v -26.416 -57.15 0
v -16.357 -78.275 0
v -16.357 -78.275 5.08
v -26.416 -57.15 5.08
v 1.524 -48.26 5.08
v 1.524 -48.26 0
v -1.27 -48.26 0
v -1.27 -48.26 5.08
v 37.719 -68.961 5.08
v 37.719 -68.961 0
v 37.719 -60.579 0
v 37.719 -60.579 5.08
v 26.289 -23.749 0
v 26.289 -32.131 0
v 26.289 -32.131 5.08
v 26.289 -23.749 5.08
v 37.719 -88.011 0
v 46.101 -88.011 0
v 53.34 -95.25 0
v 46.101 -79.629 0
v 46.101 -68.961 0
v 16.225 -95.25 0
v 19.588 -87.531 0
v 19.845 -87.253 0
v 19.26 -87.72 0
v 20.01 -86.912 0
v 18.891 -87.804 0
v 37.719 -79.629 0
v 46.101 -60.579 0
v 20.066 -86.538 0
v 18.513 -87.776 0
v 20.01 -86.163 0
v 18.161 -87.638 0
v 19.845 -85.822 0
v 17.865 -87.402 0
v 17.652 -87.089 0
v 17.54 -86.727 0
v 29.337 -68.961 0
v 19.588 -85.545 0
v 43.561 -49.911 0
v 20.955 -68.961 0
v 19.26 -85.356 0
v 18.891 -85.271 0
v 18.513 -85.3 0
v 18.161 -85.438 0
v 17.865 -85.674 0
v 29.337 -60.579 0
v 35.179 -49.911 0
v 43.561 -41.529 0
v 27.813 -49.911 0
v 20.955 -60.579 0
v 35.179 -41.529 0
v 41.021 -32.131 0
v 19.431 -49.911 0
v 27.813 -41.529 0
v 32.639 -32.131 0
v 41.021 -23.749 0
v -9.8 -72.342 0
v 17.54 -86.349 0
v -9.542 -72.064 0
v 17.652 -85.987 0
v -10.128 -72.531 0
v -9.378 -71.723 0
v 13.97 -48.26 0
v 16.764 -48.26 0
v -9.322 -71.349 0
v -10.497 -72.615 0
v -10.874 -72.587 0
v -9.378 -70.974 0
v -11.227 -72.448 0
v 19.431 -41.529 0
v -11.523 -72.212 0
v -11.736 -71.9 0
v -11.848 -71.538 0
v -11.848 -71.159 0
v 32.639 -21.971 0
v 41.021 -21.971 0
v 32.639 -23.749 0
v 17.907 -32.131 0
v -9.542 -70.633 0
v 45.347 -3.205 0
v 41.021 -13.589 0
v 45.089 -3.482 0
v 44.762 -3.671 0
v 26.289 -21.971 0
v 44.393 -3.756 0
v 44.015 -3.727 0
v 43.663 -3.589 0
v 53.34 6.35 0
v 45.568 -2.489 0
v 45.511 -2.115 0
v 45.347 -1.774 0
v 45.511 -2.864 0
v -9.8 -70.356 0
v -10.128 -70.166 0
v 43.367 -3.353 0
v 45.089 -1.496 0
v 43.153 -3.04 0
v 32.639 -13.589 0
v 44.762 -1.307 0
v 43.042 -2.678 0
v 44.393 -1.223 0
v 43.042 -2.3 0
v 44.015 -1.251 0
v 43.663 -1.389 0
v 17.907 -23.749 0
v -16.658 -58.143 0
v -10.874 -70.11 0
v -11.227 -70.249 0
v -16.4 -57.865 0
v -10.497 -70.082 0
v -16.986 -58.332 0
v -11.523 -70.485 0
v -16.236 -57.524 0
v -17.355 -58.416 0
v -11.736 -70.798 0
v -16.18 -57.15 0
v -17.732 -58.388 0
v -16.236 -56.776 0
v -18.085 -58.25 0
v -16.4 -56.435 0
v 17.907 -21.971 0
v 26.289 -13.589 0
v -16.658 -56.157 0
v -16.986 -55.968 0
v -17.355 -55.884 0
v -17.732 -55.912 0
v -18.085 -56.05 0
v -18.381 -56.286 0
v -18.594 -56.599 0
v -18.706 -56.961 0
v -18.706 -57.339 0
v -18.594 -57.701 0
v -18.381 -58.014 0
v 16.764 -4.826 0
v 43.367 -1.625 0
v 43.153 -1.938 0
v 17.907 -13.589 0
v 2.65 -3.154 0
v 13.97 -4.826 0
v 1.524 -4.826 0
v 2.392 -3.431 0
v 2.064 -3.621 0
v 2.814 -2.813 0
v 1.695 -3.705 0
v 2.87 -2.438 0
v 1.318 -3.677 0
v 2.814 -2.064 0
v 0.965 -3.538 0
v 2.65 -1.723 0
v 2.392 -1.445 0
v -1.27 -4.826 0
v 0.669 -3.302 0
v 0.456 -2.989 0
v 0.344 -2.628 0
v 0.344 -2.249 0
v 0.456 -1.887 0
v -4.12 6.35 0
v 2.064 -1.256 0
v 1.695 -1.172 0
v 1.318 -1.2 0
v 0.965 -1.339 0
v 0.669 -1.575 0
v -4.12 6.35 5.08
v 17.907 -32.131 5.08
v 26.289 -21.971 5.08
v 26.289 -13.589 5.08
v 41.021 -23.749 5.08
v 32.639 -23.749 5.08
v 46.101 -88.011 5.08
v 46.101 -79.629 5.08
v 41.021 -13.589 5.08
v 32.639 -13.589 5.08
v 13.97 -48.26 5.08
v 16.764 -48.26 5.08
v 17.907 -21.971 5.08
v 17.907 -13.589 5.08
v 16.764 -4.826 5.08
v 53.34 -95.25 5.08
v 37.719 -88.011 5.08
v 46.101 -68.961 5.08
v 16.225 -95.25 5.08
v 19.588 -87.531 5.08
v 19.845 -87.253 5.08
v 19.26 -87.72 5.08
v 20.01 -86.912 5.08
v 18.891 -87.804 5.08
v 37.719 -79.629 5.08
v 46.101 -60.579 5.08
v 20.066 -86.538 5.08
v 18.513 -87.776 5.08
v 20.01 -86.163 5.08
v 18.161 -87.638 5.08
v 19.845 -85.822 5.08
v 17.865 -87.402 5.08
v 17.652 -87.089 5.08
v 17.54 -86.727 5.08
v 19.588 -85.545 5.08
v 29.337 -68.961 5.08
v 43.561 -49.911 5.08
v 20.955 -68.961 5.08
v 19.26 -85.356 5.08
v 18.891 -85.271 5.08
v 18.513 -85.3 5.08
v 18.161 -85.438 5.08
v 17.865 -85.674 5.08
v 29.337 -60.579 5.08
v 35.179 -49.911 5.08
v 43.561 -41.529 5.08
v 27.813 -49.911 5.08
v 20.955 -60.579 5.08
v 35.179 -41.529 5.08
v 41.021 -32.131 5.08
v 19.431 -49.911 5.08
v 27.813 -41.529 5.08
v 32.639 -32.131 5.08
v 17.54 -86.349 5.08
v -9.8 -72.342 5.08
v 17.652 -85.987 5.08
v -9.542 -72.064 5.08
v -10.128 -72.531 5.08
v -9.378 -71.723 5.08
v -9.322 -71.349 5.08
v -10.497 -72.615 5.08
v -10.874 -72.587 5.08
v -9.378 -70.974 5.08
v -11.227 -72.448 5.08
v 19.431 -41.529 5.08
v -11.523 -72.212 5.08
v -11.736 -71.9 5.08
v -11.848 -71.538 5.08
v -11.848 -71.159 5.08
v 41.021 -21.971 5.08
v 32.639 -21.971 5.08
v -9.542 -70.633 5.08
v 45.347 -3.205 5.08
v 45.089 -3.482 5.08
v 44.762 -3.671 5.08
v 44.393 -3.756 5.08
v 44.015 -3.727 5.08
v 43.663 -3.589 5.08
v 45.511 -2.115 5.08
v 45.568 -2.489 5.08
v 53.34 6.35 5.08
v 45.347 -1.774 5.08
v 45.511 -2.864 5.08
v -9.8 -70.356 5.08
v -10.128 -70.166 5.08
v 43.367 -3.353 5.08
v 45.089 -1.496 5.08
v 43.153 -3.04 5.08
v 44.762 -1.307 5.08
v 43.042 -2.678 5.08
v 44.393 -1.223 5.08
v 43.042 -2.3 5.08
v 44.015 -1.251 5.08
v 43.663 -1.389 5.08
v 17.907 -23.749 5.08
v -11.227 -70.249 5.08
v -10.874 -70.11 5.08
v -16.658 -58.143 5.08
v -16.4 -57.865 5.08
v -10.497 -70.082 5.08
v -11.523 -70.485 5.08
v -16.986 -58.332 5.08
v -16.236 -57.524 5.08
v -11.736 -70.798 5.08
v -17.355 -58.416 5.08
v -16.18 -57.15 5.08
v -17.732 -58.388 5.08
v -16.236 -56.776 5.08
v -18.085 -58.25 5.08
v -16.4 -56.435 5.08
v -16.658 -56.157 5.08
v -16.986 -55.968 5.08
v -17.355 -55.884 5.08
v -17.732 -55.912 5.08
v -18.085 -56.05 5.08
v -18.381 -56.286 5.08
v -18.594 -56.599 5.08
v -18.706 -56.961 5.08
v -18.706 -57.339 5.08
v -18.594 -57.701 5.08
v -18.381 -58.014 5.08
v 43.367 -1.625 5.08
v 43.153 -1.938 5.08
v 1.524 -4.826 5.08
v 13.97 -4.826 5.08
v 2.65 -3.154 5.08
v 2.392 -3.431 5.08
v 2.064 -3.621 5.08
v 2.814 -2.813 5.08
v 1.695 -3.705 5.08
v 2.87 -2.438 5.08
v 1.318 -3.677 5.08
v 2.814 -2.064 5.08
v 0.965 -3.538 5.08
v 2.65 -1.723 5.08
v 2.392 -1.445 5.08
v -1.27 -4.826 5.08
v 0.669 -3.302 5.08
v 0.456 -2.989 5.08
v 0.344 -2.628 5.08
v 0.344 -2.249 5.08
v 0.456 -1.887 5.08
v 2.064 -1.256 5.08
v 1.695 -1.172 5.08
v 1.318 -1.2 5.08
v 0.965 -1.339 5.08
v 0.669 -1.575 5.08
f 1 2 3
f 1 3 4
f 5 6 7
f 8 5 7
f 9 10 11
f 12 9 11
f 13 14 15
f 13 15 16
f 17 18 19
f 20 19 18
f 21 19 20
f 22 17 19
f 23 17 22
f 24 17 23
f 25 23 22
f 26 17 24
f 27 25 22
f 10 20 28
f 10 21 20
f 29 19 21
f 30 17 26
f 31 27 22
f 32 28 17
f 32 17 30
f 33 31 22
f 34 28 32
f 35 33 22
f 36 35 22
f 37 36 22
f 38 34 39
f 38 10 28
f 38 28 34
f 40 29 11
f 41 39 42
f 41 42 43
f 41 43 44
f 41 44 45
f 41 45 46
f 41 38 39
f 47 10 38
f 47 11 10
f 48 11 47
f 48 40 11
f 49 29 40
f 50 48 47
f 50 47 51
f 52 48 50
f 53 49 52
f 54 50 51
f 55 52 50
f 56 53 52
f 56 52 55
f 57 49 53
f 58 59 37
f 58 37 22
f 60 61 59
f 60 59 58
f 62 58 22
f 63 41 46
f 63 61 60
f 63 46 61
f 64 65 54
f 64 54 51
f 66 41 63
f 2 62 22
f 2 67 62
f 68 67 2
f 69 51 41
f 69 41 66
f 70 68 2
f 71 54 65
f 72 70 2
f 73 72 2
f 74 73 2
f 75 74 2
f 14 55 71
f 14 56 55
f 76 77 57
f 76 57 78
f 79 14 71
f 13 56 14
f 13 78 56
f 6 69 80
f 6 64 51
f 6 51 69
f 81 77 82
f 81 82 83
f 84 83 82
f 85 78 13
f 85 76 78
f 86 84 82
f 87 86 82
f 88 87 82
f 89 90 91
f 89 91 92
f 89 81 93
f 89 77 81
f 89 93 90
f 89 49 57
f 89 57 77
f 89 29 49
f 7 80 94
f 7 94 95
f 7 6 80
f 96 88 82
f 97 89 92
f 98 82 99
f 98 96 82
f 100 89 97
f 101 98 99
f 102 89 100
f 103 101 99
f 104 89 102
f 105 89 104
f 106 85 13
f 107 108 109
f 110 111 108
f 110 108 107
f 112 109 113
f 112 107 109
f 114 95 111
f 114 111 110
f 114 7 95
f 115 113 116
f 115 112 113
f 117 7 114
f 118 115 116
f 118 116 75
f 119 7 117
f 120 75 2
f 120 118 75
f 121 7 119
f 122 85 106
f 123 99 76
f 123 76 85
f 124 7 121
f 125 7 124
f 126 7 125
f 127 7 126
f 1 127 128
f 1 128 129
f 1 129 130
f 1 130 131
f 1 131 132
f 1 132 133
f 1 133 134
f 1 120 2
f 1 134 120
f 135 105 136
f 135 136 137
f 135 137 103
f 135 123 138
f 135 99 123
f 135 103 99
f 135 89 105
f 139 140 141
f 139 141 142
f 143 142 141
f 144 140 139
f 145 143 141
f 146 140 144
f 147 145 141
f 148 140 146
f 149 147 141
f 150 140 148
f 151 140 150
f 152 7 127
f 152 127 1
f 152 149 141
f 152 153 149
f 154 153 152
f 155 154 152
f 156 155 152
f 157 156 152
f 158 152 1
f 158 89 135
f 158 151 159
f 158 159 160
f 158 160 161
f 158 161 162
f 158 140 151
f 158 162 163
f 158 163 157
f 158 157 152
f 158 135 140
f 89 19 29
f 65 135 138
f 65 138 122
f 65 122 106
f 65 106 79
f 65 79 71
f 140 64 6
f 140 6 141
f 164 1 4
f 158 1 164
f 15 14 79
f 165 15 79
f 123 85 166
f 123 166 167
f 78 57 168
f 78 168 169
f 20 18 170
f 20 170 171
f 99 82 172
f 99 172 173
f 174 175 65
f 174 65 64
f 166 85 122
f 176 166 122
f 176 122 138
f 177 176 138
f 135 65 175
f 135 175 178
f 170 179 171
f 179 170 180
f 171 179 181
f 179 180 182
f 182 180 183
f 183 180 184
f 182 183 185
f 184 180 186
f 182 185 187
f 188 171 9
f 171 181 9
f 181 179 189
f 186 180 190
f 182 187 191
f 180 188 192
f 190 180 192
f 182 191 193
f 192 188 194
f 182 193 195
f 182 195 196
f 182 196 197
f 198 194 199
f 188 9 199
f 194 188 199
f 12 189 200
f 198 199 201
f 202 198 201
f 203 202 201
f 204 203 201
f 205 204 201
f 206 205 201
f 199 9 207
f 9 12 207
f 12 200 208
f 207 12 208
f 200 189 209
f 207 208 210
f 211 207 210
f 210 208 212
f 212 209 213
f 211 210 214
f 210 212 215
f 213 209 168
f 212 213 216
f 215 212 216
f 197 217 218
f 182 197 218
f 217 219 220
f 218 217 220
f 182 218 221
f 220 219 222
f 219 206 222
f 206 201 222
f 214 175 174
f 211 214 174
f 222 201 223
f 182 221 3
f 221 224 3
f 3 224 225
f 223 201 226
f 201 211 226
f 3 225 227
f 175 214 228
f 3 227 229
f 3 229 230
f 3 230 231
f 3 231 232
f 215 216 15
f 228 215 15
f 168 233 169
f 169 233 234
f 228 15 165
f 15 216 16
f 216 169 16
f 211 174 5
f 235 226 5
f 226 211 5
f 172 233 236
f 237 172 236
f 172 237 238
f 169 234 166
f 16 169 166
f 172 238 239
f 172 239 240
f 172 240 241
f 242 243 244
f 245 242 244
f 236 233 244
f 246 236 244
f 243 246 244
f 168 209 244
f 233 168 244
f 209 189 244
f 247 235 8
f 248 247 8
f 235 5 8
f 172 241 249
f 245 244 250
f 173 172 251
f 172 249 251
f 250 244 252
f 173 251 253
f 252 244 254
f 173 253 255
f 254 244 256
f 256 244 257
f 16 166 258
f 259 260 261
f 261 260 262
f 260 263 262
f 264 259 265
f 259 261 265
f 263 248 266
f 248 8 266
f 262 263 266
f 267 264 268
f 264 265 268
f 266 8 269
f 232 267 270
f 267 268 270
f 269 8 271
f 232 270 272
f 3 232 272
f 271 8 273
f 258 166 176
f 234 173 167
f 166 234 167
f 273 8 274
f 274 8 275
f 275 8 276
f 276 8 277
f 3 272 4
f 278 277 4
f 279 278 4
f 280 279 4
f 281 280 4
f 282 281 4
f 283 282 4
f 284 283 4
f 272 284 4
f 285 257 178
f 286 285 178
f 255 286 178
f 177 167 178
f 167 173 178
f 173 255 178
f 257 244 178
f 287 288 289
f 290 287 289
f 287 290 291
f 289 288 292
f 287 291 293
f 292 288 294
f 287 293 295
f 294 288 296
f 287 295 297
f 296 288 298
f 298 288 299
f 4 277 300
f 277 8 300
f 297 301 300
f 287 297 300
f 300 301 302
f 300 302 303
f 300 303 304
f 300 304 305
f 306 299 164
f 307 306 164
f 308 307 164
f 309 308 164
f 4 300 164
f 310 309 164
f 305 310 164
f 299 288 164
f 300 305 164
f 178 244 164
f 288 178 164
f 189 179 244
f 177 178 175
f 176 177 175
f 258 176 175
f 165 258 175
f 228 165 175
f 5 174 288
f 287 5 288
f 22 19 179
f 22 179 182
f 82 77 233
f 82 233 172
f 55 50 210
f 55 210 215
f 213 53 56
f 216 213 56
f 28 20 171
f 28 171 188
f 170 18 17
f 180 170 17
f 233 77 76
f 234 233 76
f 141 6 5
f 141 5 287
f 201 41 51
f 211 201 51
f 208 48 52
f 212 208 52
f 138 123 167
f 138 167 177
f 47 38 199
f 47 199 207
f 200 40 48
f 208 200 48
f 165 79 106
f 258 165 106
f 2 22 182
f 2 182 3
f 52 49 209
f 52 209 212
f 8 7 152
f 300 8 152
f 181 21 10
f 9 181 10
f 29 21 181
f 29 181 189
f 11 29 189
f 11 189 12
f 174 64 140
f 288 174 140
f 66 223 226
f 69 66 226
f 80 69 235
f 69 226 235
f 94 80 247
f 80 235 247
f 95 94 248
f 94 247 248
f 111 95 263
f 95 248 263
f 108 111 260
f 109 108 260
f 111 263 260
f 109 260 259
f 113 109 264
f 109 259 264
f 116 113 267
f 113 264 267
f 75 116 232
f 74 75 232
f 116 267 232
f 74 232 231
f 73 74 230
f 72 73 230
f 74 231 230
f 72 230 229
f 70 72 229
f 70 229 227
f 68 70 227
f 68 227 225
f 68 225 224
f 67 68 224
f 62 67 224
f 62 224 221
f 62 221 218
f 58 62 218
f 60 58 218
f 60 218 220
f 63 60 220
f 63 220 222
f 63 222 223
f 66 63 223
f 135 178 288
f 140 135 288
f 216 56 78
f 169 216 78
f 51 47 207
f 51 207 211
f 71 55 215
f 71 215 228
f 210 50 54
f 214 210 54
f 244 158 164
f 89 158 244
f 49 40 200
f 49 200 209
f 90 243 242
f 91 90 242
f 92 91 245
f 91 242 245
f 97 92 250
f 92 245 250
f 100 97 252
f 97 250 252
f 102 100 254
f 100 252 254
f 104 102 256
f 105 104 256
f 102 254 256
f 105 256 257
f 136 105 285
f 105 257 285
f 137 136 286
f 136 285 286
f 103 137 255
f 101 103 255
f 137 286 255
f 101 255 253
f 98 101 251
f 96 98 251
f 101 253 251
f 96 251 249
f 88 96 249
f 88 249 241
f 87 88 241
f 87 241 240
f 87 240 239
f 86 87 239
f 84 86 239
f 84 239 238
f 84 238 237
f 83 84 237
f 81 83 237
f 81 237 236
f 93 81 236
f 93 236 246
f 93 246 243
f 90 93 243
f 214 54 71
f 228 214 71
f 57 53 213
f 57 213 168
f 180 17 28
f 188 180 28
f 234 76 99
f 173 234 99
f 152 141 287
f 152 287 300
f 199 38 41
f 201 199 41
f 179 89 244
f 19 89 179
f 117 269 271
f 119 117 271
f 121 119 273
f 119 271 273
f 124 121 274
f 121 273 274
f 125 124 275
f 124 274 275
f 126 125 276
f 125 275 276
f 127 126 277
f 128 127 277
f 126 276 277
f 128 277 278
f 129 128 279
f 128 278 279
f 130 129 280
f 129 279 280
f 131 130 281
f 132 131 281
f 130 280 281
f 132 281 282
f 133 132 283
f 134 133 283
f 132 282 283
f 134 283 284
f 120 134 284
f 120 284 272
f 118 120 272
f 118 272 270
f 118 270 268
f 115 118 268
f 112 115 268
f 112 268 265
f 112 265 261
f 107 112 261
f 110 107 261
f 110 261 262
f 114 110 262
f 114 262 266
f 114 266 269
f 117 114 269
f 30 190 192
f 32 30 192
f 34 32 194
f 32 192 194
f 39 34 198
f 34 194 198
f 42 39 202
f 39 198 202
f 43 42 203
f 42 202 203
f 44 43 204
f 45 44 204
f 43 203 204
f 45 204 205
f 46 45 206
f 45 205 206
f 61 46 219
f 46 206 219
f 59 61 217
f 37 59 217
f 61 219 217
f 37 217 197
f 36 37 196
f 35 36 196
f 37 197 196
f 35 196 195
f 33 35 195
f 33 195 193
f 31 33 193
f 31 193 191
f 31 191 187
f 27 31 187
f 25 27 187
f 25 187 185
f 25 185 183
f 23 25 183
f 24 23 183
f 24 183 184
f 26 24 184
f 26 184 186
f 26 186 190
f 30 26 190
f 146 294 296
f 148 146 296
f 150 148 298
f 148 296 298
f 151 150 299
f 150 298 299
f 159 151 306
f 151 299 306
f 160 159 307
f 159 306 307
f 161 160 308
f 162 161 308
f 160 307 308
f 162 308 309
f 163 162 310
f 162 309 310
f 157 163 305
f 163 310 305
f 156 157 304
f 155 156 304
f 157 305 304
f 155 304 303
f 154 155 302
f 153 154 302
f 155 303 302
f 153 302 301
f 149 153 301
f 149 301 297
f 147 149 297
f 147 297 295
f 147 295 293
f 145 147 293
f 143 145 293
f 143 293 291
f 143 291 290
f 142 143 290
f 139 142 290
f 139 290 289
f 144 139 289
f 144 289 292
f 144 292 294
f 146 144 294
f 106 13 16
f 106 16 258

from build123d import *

# Parameters (mm, degrees)
BOSS_EXTRUDE1_DEPTH = 5.08
SKETCH5_W           = 8.382
SKETCH5_H           = 8.382
SKETCH5_W_2         = 2.794
SKETCH5_H_2         = 43.434
CUT_EXTRUDE1_DEPTH  = 6.08
SKETCH7_R           = 1.27
CUT_EXTRUDE3_DEPTH  = 6.08


with BuildPart() as part:
    # Sketch1 → Boss-Extrude1 (new body)
    with BuildSketch(Plane.XY):
        Polygon((-4.120444444, 6.35), (53.34, 6.35), (53.34, -95.25), (16.22499019, -95.25), (-16.356614113, -78.274710363), (-26.416, -57.15), align=None)
    extrude(amount=BOSS_EXTRUDE1_DEPTH)

    # Sketch5 → Cut-Extrude1 (cut, through all)
    with BuildSketch(Plane(origin=(0, 0, 0), x_dir=(-1, 0, 0), z_dir=(0, 0, -1))):
        with Locations((-36.83, -17.78)):
            Rectangle(SKETCH5_W, SKETCH5_H)
        with Locations((-39.37, -45.72)):
            Rectangle(SKETCH5_W, SKETCH5_H)
        with Locations((-36.83, -27.94)):
            Rectangle(SKETCH5_W, SKETCH5_H)
        with Locations((-41.91, -64.77)):
            Rectangle(SKETCH5_W, SKETCH5_H)
        with Locations((-41.91, -83.82)):
            Rectangle(SKETCH5_W, SKETCH5_H)
        with Locations((-22.098, -17.78)):
            Rectangle(SKETCH5_W, SKETCH5_H)
        with Locations((-22.098, -27.94)):
            Rectangle(SKETCH5_W, SKETCH5_H)
        with Locations((-23.622, -45.72)):
            Rectangle(SKETCH5_W, SKETCH5_H)
        with Locations((-25.146, -64.77)):
            Rectangle(SKETCH5_W, SKETCH5_H)
        with Locations((-15.367, -26.543)):
            Rectangle(SKETCH5_W_2, SKETCH5_H_2)
        with Locations((-0.127, -26.543)):
            Rectangle(SKETCH5_W_2, SKETCH5_H_2)
    extrude(amount=-CUT_EXTRUDE1_DEPTH, mode=Mode.SUBTRACT)

    # Sketch7 → Cut-Extrude3 (cut, through all)
    with BuildSketch(Plane.XY.offset(5.08)):
        with Locations((44.2976, -2.4892)):
            Circle(SKETCH7_R)
        with Locations((1.6002, -2.4384)):
            Circle(SKETCH7_R)
        with Locations((-17.4498, -57.15)):
            Circle(SKETCH7_R)
        with Locations((-10.5918, -71.3486)):
            Circle(SKETCH7_R)
        with Locations((18.796, -86.5378)):
            Circle(SKETCH7_R)
    extrude(amount=-CUT_EXTRUDE3_DEPTH, mode=Mode.SUBTRACT)


solid = part.part
